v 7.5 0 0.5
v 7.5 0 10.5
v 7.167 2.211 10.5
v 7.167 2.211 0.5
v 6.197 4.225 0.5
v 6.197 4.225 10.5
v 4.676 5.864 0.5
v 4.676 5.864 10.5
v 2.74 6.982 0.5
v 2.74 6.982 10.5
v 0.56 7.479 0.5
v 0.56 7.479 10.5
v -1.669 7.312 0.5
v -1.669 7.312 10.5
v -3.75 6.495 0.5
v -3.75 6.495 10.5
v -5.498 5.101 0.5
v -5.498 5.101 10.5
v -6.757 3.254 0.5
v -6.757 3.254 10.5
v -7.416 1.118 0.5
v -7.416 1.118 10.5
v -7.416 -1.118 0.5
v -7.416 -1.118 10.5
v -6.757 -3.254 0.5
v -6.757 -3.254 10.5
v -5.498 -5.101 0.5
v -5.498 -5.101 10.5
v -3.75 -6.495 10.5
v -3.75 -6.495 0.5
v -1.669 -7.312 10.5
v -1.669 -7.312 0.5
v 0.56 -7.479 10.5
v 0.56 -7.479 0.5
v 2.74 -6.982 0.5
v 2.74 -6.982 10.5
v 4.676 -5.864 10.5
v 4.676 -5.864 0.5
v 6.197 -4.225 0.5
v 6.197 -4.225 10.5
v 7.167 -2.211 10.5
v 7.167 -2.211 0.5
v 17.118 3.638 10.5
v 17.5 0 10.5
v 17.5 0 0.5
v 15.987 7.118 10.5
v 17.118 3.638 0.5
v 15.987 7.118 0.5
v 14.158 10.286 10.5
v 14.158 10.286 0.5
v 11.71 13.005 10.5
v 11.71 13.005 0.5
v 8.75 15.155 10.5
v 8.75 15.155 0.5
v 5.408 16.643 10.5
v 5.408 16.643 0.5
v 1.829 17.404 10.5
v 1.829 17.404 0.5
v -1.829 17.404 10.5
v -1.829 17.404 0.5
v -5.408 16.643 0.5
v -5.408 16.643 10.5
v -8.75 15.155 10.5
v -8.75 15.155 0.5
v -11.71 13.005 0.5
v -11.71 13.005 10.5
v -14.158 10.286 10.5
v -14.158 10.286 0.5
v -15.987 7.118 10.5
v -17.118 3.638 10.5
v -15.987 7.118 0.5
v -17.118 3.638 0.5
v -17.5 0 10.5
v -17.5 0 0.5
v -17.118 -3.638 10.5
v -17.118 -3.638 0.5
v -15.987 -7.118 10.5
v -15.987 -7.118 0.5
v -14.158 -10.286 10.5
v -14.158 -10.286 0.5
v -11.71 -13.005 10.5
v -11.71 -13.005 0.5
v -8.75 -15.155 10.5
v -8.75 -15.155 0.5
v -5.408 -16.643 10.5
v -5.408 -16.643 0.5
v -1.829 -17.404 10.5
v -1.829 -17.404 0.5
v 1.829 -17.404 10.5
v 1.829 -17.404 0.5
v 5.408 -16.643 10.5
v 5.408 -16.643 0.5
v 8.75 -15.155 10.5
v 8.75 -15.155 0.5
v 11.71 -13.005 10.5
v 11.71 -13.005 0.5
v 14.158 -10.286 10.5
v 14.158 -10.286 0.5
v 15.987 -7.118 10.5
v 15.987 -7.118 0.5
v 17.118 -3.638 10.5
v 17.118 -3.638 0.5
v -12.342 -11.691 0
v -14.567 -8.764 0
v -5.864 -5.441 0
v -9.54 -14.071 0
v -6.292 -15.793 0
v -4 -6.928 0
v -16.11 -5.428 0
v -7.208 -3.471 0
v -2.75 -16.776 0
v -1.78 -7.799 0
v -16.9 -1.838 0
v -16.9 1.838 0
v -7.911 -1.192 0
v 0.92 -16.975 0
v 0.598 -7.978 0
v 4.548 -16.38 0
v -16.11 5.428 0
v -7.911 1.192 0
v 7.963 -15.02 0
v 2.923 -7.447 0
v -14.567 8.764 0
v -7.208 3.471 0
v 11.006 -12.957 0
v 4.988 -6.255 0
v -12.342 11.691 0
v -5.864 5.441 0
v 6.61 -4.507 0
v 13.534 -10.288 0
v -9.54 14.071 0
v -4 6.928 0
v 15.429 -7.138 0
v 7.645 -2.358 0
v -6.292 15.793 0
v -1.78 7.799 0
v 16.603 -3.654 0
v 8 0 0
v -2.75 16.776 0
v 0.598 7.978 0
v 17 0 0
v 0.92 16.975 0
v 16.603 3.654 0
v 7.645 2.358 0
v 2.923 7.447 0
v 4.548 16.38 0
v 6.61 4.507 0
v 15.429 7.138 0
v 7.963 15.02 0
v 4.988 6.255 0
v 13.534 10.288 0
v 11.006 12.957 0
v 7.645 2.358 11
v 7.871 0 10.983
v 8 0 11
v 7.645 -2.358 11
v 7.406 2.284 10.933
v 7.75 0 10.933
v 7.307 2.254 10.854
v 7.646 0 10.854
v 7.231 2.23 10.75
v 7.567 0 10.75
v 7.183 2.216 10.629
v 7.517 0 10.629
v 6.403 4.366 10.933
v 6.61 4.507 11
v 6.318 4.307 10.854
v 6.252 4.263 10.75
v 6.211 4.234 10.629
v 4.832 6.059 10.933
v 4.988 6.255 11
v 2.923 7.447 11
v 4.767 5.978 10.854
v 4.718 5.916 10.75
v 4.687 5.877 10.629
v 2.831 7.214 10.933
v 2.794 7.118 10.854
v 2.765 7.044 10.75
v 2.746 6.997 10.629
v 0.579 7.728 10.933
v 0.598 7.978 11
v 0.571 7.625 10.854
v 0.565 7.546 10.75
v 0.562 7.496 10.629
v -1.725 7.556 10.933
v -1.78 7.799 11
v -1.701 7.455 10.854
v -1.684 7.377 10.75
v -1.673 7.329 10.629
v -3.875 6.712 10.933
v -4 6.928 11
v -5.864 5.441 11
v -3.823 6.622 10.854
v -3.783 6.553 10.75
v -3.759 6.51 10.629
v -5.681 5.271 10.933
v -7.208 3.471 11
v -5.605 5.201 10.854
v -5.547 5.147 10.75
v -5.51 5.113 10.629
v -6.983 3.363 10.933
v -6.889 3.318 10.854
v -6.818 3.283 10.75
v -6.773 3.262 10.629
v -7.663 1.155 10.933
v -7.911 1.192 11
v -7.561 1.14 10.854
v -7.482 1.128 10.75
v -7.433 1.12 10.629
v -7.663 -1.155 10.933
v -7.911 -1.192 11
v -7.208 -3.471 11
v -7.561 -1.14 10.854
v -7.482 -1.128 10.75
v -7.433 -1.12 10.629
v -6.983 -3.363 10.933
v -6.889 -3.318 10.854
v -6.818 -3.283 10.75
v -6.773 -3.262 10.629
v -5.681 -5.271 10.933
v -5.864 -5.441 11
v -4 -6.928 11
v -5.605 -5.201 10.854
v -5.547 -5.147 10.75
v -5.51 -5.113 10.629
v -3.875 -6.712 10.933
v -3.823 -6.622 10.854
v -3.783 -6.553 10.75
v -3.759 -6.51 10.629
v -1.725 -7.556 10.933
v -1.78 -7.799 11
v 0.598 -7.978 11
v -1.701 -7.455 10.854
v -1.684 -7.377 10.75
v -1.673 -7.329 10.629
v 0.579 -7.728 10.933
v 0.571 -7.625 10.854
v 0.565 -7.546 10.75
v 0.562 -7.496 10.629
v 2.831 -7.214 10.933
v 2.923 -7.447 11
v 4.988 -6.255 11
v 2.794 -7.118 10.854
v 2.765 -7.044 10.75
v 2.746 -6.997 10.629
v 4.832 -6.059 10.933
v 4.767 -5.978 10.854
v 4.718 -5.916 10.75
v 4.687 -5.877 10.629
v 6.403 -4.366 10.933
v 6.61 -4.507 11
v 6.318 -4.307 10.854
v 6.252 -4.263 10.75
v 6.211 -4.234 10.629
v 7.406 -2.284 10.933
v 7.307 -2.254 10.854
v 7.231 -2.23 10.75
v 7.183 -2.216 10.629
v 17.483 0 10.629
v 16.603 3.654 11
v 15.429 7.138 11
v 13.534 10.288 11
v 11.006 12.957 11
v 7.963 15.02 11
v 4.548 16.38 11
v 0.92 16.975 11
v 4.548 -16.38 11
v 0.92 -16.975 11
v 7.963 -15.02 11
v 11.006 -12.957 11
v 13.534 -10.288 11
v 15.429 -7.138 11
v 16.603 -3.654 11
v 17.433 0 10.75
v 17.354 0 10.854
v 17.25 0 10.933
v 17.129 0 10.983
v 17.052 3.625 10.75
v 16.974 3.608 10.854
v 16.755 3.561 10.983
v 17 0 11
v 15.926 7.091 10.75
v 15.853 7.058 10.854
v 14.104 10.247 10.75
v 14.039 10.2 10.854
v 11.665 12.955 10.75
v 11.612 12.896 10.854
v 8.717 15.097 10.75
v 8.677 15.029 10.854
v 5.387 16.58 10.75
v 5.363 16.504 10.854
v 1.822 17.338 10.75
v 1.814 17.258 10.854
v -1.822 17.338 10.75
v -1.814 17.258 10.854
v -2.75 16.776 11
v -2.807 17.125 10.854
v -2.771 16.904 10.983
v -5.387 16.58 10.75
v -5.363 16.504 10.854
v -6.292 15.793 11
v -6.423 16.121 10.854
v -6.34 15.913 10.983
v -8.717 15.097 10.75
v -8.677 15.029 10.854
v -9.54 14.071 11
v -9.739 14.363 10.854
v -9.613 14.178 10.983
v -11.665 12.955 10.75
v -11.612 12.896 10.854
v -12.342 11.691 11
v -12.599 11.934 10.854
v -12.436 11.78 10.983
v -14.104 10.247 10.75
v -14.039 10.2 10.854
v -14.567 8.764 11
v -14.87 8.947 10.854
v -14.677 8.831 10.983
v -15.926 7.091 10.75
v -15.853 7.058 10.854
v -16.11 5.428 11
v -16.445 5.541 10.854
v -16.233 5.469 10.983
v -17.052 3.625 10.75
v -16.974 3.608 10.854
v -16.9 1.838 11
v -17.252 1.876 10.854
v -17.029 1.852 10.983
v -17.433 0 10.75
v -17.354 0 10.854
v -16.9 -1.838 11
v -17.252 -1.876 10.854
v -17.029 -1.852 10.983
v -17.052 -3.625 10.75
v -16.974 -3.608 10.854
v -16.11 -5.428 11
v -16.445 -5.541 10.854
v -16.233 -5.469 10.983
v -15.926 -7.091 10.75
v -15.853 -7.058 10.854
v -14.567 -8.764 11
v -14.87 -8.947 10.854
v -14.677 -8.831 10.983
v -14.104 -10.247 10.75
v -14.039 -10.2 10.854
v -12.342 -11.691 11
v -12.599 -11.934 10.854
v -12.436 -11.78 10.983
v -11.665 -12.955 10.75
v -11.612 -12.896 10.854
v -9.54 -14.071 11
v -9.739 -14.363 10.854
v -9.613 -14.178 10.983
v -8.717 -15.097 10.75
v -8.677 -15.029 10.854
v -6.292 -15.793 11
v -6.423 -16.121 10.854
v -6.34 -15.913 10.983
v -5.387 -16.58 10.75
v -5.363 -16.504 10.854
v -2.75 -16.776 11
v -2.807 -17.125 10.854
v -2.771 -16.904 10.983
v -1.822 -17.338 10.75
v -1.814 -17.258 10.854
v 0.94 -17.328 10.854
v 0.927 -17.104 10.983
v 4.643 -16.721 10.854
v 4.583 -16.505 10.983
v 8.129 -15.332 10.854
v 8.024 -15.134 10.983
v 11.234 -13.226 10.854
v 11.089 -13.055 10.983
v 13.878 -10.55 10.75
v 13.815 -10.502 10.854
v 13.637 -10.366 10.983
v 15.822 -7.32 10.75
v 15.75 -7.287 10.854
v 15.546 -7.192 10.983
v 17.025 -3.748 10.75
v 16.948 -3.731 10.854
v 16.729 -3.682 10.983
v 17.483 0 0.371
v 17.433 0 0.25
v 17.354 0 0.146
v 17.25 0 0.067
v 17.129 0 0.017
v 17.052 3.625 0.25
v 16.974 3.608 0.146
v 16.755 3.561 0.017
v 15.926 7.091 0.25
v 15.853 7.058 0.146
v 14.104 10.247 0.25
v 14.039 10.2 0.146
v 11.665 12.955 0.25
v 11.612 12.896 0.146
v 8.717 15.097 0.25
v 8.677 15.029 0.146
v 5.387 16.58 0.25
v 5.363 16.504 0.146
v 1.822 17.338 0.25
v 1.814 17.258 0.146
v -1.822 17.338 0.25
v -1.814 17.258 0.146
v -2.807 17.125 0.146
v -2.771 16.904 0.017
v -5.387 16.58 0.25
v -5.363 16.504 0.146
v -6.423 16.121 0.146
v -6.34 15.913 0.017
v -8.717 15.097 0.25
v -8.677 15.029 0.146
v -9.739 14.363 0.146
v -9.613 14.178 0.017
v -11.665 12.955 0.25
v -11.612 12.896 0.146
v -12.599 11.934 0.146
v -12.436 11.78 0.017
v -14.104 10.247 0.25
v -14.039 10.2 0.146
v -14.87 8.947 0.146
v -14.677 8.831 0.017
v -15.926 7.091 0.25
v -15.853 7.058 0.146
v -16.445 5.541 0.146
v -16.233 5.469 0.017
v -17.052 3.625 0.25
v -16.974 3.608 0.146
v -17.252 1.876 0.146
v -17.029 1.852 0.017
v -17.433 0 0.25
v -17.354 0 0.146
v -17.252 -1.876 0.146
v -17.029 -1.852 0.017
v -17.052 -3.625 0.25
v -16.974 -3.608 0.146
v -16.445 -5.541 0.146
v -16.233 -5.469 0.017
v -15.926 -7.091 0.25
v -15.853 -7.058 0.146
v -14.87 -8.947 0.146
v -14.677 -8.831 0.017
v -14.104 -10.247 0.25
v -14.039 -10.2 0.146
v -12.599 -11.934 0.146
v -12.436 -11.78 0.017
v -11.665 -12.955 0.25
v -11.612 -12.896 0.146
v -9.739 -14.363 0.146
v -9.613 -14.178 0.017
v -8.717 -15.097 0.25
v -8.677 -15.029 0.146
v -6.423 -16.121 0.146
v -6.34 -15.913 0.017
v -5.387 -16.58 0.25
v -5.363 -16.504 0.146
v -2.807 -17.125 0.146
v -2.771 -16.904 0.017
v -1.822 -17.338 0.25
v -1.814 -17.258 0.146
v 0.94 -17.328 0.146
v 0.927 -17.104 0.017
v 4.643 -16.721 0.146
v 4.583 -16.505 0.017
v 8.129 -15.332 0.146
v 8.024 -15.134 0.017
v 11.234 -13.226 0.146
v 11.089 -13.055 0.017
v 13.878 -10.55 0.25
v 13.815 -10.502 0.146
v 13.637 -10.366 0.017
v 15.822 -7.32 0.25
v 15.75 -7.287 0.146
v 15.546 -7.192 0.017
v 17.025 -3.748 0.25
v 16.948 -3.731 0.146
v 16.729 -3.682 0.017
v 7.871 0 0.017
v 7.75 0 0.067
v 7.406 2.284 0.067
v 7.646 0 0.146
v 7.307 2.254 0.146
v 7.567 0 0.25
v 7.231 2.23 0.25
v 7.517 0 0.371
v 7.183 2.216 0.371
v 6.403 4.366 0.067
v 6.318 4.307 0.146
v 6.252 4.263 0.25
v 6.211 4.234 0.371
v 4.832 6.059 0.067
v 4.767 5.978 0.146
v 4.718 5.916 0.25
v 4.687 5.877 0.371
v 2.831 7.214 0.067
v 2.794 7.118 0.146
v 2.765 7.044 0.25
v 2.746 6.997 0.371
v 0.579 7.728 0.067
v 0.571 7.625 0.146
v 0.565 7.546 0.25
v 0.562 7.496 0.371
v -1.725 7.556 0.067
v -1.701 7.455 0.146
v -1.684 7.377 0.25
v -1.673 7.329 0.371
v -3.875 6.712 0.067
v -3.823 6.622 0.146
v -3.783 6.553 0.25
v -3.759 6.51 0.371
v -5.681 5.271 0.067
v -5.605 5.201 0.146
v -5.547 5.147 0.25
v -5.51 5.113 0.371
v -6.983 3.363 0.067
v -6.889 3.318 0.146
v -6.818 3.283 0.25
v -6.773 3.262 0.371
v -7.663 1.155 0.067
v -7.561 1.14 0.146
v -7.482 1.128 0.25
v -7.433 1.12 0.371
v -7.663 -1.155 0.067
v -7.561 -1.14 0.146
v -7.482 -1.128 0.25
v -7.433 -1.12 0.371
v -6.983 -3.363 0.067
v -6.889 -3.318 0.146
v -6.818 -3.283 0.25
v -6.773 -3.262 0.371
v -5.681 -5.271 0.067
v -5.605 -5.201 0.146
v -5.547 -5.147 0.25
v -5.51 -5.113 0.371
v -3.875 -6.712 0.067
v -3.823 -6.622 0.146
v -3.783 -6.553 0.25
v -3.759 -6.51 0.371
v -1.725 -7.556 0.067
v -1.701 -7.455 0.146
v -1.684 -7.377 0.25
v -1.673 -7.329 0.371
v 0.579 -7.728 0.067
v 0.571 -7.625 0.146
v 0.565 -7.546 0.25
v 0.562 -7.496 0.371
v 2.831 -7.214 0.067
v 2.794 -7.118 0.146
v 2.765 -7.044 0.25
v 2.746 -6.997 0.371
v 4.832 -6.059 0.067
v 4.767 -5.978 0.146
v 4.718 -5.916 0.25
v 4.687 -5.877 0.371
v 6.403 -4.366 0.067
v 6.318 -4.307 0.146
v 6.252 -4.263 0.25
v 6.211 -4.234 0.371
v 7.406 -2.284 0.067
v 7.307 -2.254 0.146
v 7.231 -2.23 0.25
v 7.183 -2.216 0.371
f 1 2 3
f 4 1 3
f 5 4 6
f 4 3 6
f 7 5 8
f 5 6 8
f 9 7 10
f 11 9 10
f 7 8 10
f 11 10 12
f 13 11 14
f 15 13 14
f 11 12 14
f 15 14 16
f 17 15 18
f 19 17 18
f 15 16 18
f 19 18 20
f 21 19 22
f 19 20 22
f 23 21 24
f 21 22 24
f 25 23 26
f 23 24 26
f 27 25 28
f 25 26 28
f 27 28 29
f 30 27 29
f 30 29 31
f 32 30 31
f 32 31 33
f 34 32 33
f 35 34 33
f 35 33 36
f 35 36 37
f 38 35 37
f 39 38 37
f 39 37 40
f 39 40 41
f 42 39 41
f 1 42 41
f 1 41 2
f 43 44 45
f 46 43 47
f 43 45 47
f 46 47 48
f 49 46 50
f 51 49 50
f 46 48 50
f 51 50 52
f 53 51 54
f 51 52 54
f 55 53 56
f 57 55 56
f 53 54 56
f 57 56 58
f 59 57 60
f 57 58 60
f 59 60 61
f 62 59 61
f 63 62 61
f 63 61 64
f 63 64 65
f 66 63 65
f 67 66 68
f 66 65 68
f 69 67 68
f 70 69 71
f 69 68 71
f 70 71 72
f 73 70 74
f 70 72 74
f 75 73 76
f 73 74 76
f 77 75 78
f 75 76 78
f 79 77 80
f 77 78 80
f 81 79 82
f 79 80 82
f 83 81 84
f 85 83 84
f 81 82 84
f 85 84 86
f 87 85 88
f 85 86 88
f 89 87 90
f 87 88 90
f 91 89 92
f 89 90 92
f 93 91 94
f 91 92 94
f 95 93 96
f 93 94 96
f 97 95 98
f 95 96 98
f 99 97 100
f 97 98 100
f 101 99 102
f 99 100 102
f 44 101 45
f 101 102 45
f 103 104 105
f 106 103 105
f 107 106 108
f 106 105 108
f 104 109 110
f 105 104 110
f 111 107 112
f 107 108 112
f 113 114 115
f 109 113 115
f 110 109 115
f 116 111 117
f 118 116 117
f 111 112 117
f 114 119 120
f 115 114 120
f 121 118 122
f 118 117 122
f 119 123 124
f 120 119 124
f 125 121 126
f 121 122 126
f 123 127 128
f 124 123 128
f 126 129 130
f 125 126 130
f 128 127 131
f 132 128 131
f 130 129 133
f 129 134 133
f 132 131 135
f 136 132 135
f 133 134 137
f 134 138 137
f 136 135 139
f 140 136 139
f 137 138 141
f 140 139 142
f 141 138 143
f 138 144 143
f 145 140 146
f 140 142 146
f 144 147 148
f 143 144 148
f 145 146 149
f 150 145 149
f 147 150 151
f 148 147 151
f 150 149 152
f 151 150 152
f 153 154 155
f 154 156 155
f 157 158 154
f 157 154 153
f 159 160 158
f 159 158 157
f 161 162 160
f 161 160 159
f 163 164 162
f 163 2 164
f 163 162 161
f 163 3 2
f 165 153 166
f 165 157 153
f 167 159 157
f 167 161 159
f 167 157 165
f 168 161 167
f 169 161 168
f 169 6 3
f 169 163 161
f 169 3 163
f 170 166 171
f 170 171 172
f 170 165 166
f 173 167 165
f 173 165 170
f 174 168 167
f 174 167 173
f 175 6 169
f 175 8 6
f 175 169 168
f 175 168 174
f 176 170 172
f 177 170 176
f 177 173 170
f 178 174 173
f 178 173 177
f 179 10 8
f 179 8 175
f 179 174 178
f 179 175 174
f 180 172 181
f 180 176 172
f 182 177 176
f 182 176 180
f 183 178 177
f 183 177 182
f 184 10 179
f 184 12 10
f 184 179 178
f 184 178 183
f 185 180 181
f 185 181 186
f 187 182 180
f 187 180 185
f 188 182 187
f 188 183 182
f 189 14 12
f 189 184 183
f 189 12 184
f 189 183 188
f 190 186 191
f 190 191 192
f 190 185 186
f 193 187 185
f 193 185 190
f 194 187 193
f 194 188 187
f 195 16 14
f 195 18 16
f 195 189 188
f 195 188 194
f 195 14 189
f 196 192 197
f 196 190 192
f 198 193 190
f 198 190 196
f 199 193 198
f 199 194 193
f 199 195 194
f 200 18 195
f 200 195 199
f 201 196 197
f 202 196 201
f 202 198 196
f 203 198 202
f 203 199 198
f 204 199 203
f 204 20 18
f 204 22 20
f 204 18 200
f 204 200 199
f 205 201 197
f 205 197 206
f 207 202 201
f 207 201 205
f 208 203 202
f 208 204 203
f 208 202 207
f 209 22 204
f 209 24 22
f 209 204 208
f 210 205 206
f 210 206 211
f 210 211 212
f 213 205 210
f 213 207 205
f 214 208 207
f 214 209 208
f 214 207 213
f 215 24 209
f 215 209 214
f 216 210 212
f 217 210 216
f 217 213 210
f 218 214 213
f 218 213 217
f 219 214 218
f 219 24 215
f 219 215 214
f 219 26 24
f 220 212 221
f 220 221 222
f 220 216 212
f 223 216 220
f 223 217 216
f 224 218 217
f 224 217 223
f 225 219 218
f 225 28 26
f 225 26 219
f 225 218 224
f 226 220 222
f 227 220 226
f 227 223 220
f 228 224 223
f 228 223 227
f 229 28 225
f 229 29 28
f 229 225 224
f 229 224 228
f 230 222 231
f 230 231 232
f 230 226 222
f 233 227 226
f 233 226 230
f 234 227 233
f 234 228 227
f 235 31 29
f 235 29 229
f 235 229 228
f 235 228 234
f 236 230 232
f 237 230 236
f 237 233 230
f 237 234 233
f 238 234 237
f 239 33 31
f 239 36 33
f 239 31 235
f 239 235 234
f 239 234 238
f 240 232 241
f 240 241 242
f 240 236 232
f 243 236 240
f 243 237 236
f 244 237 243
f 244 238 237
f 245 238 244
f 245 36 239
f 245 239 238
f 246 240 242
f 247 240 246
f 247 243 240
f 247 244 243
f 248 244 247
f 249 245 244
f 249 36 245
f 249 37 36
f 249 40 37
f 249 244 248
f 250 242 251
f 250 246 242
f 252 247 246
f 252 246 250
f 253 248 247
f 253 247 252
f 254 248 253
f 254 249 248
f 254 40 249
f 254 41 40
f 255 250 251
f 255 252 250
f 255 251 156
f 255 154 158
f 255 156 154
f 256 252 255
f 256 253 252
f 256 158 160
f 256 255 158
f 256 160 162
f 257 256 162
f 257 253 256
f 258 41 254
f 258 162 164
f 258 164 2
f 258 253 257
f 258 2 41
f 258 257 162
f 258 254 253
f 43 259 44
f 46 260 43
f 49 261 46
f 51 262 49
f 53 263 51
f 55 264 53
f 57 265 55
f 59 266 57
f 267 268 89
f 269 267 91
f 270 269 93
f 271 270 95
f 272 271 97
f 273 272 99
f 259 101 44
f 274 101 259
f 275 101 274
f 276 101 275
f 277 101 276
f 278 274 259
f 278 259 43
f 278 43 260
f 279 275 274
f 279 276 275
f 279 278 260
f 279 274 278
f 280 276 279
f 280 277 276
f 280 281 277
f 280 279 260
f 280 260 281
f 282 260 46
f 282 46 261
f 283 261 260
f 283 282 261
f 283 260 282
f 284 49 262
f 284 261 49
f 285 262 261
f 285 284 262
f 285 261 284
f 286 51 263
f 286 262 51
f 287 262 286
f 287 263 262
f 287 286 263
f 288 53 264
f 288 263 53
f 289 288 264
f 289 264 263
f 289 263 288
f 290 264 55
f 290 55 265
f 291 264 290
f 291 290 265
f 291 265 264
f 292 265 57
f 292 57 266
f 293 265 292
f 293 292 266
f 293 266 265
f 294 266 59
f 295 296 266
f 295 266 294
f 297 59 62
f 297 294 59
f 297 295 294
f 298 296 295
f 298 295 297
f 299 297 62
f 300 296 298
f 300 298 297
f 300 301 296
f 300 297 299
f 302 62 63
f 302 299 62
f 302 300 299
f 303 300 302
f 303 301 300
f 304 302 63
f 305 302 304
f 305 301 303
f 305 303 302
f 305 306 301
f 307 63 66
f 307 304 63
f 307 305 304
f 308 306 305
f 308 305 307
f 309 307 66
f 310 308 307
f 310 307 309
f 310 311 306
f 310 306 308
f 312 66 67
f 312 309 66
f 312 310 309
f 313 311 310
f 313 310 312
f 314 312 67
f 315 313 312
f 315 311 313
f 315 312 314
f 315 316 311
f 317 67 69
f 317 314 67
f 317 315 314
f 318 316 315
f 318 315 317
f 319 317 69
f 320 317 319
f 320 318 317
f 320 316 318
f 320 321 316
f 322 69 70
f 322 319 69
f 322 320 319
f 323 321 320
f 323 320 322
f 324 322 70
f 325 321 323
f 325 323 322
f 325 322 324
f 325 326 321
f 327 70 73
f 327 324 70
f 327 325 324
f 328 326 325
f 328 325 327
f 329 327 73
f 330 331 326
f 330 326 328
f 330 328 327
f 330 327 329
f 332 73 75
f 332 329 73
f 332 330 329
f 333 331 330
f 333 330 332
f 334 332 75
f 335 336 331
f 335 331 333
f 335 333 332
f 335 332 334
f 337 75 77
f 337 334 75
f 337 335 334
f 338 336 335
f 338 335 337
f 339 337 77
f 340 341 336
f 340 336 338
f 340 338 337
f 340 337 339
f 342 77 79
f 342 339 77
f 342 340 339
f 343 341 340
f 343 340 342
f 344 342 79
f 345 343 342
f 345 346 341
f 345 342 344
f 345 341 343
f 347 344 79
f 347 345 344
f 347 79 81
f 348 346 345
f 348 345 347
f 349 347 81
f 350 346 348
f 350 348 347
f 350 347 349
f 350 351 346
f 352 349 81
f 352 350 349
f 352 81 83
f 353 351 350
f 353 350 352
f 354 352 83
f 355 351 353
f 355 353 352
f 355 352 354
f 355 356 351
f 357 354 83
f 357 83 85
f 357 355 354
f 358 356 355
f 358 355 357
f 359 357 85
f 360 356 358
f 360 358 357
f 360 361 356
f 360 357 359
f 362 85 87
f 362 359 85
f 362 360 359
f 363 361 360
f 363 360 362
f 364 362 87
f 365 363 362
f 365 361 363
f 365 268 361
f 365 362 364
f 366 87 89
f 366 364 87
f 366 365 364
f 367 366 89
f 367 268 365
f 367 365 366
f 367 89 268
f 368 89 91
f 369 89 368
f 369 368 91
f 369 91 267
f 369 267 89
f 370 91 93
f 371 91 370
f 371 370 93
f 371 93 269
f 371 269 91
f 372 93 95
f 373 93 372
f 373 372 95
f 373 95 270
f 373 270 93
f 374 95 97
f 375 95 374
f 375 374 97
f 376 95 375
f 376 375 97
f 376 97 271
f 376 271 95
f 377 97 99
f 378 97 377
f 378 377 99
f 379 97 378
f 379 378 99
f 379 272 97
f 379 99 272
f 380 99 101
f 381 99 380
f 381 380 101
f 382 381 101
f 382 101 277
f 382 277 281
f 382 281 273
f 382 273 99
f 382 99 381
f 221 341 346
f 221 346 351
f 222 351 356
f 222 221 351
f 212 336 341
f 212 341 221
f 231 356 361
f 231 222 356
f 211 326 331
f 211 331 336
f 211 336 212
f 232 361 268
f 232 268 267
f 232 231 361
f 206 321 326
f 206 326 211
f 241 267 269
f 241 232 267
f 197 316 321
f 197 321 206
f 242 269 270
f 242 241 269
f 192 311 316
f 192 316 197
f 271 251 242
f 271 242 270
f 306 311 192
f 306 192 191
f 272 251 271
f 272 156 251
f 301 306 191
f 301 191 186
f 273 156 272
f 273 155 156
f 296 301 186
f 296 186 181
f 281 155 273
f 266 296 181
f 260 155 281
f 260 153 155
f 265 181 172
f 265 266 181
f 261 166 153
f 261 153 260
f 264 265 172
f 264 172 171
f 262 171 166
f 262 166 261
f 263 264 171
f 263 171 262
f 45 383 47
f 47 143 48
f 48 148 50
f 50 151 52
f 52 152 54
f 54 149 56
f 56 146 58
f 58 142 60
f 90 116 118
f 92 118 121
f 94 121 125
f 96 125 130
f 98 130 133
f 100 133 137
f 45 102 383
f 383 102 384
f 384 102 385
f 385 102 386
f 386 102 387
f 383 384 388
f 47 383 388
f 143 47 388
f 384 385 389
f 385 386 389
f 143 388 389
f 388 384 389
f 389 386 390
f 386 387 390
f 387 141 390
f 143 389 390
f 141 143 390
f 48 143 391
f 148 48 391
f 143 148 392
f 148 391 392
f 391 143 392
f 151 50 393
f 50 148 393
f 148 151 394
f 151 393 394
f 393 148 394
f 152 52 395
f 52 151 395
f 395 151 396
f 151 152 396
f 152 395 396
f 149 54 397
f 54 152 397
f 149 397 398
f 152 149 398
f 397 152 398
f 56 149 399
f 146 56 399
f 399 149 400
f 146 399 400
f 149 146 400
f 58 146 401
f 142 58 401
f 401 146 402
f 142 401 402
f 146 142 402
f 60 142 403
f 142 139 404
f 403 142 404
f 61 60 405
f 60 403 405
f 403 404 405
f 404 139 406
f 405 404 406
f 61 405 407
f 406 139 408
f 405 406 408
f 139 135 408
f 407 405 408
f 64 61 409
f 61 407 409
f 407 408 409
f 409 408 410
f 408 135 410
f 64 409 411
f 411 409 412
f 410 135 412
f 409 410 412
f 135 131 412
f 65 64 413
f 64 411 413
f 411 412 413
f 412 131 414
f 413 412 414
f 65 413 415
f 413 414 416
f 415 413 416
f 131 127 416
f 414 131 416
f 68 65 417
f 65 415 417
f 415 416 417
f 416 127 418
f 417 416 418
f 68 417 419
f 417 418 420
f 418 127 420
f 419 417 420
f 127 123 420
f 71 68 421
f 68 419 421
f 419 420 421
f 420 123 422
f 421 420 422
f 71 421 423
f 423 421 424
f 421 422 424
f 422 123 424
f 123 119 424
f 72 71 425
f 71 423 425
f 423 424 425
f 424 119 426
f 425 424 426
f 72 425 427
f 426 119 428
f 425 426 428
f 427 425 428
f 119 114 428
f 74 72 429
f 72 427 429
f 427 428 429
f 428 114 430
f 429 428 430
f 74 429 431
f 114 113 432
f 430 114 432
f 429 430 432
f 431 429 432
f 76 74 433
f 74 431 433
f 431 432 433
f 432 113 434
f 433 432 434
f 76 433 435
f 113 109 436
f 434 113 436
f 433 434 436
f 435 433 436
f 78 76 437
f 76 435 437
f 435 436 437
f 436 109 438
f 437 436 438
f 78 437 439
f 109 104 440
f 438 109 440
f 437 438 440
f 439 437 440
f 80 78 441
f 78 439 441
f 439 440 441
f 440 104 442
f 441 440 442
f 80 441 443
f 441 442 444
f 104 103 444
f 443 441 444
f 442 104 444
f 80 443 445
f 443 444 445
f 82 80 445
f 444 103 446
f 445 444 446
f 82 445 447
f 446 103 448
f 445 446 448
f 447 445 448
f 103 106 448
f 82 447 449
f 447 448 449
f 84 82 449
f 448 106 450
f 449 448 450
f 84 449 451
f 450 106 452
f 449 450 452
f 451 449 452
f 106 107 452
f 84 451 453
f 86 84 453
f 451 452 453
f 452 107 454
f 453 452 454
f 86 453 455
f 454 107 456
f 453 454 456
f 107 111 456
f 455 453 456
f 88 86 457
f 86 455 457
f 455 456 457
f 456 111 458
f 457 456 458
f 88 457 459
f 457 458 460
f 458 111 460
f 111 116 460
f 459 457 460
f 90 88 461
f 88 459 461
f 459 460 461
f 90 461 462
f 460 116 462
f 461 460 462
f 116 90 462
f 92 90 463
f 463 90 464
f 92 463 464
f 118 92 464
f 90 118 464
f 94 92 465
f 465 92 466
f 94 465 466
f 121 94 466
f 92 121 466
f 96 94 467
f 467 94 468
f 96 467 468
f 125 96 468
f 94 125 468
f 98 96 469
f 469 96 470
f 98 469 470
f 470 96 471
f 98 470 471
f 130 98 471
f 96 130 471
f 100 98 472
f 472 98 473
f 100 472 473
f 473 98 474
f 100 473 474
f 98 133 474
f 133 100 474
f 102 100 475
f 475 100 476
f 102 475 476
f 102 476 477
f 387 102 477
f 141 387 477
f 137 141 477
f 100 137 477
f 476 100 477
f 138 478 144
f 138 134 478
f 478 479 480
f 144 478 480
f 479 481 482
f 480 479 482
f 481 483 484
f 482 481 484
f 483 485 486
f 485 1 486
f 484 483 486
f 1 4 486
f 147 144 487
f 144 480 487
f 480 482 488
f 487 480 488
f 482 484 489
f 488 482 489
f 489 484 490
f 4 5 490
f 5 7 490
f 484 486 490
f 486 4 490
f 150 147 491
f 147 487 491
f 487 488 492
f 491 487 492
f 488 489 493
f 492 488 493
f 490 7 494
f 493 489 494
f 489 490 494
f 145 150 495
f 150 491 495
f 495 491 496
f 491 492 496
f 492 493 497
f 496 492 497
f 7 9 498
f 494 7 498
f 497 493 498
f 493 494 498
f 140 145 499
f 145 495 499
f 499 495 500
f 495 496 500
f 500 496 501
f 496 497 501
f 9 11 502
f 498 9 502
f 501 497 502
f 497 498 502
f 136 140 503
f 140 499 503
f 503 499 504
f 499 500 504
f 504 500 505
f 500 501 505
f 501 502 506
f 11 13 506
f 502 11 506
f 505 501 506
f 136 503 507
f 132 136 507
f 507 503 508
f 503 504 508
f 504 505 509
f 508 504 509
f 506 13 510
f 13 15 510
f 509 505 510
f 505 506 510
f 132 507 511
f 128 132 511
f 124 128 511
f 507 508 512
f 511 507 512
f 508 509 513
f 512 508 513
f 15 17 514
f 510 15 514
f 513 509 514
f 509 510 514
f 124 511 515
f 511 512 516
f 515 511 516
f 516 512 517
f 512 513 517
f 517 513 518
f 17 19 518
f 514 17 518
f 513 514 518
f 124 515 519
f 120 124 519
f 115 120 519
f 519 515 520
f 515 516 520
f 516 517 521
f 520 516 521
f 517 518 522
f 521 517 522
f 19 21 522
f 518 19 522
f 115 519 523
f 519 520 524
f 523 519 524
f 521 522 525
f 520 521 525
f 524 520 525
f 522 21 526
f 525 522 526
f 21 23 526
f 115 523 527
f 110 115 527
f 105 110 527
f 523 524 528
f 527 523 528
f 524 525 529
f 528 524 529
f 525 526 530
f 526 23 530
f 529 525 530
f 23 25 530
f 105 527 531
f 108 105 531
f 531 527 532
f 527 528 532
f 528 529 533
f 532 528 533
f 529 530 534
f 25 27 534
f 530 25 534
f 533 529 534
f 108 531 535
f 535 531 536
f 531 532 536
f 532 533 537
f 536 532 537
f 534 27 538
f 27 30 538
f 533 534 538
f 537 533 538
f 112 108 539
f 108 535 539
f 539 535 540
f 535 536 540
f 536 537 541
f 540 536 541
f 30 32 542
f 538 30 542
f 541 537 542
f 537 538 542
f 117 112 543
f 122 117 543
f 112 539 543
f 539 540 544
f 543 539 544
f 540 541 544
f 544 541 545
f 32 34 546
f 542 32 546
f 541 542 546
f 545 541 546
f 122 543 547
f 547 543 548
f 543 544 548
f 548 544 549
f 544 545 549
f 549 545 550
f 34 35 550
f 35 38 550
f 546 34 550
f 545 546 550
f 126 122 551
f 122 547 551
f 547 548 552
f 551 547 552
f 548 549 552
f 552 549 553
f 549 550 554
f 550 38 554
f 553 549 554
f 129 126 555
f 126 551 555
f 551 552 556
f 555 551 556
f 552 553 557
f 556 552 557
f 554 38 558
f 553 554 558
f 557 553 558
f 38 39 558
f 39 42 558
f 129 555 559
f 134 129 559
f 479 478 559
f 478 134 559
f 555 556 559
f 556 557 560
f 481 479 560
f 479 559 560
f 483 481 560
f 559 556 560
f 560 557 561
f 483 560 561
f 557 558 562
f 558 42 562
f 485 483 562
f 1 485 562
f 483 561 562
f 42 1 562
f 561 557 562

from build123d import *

# Parameters (mm, degrees)
F0_R     = 17.5
F1_DEPTH = 11
F2_R     = 7.5
F3_DEPTH = 11.001
F4_R     = 0.5
F5_R     = 0.5


with BuildPart() as f1:
    # F0 (on Top) → F1 (new body)
    with BuildSketch(Plane.XY):
        Circle(F0_R)
    extrude(amount=F1_DEPTH)

    # F2 (on face) → F3 (cut, through all)
    with BuildSketch(Plane.XY.offset(11)):
        Circle(F2_R)
    extrude(amount=-F3_DEPTH, mode=Mode.SUBTRACT)

    # F4
    f4_edges = [f1.edges().sort_by_distance(p)[0] for p in [
        (-17.5, 0, 11),
        (-17.5, 0, 0),
    ]]
    fillet(f4_edges, radius=F4_R)

    # F5
    f5_edges = [f1.edges().sort_by_distance(p)[0] for p in [
        (-7.5, 0, 11),
        (-7.5, 0, 0),
    ]]
    fillet(f5_edges, radius=F5_R)


solid = f1.part
